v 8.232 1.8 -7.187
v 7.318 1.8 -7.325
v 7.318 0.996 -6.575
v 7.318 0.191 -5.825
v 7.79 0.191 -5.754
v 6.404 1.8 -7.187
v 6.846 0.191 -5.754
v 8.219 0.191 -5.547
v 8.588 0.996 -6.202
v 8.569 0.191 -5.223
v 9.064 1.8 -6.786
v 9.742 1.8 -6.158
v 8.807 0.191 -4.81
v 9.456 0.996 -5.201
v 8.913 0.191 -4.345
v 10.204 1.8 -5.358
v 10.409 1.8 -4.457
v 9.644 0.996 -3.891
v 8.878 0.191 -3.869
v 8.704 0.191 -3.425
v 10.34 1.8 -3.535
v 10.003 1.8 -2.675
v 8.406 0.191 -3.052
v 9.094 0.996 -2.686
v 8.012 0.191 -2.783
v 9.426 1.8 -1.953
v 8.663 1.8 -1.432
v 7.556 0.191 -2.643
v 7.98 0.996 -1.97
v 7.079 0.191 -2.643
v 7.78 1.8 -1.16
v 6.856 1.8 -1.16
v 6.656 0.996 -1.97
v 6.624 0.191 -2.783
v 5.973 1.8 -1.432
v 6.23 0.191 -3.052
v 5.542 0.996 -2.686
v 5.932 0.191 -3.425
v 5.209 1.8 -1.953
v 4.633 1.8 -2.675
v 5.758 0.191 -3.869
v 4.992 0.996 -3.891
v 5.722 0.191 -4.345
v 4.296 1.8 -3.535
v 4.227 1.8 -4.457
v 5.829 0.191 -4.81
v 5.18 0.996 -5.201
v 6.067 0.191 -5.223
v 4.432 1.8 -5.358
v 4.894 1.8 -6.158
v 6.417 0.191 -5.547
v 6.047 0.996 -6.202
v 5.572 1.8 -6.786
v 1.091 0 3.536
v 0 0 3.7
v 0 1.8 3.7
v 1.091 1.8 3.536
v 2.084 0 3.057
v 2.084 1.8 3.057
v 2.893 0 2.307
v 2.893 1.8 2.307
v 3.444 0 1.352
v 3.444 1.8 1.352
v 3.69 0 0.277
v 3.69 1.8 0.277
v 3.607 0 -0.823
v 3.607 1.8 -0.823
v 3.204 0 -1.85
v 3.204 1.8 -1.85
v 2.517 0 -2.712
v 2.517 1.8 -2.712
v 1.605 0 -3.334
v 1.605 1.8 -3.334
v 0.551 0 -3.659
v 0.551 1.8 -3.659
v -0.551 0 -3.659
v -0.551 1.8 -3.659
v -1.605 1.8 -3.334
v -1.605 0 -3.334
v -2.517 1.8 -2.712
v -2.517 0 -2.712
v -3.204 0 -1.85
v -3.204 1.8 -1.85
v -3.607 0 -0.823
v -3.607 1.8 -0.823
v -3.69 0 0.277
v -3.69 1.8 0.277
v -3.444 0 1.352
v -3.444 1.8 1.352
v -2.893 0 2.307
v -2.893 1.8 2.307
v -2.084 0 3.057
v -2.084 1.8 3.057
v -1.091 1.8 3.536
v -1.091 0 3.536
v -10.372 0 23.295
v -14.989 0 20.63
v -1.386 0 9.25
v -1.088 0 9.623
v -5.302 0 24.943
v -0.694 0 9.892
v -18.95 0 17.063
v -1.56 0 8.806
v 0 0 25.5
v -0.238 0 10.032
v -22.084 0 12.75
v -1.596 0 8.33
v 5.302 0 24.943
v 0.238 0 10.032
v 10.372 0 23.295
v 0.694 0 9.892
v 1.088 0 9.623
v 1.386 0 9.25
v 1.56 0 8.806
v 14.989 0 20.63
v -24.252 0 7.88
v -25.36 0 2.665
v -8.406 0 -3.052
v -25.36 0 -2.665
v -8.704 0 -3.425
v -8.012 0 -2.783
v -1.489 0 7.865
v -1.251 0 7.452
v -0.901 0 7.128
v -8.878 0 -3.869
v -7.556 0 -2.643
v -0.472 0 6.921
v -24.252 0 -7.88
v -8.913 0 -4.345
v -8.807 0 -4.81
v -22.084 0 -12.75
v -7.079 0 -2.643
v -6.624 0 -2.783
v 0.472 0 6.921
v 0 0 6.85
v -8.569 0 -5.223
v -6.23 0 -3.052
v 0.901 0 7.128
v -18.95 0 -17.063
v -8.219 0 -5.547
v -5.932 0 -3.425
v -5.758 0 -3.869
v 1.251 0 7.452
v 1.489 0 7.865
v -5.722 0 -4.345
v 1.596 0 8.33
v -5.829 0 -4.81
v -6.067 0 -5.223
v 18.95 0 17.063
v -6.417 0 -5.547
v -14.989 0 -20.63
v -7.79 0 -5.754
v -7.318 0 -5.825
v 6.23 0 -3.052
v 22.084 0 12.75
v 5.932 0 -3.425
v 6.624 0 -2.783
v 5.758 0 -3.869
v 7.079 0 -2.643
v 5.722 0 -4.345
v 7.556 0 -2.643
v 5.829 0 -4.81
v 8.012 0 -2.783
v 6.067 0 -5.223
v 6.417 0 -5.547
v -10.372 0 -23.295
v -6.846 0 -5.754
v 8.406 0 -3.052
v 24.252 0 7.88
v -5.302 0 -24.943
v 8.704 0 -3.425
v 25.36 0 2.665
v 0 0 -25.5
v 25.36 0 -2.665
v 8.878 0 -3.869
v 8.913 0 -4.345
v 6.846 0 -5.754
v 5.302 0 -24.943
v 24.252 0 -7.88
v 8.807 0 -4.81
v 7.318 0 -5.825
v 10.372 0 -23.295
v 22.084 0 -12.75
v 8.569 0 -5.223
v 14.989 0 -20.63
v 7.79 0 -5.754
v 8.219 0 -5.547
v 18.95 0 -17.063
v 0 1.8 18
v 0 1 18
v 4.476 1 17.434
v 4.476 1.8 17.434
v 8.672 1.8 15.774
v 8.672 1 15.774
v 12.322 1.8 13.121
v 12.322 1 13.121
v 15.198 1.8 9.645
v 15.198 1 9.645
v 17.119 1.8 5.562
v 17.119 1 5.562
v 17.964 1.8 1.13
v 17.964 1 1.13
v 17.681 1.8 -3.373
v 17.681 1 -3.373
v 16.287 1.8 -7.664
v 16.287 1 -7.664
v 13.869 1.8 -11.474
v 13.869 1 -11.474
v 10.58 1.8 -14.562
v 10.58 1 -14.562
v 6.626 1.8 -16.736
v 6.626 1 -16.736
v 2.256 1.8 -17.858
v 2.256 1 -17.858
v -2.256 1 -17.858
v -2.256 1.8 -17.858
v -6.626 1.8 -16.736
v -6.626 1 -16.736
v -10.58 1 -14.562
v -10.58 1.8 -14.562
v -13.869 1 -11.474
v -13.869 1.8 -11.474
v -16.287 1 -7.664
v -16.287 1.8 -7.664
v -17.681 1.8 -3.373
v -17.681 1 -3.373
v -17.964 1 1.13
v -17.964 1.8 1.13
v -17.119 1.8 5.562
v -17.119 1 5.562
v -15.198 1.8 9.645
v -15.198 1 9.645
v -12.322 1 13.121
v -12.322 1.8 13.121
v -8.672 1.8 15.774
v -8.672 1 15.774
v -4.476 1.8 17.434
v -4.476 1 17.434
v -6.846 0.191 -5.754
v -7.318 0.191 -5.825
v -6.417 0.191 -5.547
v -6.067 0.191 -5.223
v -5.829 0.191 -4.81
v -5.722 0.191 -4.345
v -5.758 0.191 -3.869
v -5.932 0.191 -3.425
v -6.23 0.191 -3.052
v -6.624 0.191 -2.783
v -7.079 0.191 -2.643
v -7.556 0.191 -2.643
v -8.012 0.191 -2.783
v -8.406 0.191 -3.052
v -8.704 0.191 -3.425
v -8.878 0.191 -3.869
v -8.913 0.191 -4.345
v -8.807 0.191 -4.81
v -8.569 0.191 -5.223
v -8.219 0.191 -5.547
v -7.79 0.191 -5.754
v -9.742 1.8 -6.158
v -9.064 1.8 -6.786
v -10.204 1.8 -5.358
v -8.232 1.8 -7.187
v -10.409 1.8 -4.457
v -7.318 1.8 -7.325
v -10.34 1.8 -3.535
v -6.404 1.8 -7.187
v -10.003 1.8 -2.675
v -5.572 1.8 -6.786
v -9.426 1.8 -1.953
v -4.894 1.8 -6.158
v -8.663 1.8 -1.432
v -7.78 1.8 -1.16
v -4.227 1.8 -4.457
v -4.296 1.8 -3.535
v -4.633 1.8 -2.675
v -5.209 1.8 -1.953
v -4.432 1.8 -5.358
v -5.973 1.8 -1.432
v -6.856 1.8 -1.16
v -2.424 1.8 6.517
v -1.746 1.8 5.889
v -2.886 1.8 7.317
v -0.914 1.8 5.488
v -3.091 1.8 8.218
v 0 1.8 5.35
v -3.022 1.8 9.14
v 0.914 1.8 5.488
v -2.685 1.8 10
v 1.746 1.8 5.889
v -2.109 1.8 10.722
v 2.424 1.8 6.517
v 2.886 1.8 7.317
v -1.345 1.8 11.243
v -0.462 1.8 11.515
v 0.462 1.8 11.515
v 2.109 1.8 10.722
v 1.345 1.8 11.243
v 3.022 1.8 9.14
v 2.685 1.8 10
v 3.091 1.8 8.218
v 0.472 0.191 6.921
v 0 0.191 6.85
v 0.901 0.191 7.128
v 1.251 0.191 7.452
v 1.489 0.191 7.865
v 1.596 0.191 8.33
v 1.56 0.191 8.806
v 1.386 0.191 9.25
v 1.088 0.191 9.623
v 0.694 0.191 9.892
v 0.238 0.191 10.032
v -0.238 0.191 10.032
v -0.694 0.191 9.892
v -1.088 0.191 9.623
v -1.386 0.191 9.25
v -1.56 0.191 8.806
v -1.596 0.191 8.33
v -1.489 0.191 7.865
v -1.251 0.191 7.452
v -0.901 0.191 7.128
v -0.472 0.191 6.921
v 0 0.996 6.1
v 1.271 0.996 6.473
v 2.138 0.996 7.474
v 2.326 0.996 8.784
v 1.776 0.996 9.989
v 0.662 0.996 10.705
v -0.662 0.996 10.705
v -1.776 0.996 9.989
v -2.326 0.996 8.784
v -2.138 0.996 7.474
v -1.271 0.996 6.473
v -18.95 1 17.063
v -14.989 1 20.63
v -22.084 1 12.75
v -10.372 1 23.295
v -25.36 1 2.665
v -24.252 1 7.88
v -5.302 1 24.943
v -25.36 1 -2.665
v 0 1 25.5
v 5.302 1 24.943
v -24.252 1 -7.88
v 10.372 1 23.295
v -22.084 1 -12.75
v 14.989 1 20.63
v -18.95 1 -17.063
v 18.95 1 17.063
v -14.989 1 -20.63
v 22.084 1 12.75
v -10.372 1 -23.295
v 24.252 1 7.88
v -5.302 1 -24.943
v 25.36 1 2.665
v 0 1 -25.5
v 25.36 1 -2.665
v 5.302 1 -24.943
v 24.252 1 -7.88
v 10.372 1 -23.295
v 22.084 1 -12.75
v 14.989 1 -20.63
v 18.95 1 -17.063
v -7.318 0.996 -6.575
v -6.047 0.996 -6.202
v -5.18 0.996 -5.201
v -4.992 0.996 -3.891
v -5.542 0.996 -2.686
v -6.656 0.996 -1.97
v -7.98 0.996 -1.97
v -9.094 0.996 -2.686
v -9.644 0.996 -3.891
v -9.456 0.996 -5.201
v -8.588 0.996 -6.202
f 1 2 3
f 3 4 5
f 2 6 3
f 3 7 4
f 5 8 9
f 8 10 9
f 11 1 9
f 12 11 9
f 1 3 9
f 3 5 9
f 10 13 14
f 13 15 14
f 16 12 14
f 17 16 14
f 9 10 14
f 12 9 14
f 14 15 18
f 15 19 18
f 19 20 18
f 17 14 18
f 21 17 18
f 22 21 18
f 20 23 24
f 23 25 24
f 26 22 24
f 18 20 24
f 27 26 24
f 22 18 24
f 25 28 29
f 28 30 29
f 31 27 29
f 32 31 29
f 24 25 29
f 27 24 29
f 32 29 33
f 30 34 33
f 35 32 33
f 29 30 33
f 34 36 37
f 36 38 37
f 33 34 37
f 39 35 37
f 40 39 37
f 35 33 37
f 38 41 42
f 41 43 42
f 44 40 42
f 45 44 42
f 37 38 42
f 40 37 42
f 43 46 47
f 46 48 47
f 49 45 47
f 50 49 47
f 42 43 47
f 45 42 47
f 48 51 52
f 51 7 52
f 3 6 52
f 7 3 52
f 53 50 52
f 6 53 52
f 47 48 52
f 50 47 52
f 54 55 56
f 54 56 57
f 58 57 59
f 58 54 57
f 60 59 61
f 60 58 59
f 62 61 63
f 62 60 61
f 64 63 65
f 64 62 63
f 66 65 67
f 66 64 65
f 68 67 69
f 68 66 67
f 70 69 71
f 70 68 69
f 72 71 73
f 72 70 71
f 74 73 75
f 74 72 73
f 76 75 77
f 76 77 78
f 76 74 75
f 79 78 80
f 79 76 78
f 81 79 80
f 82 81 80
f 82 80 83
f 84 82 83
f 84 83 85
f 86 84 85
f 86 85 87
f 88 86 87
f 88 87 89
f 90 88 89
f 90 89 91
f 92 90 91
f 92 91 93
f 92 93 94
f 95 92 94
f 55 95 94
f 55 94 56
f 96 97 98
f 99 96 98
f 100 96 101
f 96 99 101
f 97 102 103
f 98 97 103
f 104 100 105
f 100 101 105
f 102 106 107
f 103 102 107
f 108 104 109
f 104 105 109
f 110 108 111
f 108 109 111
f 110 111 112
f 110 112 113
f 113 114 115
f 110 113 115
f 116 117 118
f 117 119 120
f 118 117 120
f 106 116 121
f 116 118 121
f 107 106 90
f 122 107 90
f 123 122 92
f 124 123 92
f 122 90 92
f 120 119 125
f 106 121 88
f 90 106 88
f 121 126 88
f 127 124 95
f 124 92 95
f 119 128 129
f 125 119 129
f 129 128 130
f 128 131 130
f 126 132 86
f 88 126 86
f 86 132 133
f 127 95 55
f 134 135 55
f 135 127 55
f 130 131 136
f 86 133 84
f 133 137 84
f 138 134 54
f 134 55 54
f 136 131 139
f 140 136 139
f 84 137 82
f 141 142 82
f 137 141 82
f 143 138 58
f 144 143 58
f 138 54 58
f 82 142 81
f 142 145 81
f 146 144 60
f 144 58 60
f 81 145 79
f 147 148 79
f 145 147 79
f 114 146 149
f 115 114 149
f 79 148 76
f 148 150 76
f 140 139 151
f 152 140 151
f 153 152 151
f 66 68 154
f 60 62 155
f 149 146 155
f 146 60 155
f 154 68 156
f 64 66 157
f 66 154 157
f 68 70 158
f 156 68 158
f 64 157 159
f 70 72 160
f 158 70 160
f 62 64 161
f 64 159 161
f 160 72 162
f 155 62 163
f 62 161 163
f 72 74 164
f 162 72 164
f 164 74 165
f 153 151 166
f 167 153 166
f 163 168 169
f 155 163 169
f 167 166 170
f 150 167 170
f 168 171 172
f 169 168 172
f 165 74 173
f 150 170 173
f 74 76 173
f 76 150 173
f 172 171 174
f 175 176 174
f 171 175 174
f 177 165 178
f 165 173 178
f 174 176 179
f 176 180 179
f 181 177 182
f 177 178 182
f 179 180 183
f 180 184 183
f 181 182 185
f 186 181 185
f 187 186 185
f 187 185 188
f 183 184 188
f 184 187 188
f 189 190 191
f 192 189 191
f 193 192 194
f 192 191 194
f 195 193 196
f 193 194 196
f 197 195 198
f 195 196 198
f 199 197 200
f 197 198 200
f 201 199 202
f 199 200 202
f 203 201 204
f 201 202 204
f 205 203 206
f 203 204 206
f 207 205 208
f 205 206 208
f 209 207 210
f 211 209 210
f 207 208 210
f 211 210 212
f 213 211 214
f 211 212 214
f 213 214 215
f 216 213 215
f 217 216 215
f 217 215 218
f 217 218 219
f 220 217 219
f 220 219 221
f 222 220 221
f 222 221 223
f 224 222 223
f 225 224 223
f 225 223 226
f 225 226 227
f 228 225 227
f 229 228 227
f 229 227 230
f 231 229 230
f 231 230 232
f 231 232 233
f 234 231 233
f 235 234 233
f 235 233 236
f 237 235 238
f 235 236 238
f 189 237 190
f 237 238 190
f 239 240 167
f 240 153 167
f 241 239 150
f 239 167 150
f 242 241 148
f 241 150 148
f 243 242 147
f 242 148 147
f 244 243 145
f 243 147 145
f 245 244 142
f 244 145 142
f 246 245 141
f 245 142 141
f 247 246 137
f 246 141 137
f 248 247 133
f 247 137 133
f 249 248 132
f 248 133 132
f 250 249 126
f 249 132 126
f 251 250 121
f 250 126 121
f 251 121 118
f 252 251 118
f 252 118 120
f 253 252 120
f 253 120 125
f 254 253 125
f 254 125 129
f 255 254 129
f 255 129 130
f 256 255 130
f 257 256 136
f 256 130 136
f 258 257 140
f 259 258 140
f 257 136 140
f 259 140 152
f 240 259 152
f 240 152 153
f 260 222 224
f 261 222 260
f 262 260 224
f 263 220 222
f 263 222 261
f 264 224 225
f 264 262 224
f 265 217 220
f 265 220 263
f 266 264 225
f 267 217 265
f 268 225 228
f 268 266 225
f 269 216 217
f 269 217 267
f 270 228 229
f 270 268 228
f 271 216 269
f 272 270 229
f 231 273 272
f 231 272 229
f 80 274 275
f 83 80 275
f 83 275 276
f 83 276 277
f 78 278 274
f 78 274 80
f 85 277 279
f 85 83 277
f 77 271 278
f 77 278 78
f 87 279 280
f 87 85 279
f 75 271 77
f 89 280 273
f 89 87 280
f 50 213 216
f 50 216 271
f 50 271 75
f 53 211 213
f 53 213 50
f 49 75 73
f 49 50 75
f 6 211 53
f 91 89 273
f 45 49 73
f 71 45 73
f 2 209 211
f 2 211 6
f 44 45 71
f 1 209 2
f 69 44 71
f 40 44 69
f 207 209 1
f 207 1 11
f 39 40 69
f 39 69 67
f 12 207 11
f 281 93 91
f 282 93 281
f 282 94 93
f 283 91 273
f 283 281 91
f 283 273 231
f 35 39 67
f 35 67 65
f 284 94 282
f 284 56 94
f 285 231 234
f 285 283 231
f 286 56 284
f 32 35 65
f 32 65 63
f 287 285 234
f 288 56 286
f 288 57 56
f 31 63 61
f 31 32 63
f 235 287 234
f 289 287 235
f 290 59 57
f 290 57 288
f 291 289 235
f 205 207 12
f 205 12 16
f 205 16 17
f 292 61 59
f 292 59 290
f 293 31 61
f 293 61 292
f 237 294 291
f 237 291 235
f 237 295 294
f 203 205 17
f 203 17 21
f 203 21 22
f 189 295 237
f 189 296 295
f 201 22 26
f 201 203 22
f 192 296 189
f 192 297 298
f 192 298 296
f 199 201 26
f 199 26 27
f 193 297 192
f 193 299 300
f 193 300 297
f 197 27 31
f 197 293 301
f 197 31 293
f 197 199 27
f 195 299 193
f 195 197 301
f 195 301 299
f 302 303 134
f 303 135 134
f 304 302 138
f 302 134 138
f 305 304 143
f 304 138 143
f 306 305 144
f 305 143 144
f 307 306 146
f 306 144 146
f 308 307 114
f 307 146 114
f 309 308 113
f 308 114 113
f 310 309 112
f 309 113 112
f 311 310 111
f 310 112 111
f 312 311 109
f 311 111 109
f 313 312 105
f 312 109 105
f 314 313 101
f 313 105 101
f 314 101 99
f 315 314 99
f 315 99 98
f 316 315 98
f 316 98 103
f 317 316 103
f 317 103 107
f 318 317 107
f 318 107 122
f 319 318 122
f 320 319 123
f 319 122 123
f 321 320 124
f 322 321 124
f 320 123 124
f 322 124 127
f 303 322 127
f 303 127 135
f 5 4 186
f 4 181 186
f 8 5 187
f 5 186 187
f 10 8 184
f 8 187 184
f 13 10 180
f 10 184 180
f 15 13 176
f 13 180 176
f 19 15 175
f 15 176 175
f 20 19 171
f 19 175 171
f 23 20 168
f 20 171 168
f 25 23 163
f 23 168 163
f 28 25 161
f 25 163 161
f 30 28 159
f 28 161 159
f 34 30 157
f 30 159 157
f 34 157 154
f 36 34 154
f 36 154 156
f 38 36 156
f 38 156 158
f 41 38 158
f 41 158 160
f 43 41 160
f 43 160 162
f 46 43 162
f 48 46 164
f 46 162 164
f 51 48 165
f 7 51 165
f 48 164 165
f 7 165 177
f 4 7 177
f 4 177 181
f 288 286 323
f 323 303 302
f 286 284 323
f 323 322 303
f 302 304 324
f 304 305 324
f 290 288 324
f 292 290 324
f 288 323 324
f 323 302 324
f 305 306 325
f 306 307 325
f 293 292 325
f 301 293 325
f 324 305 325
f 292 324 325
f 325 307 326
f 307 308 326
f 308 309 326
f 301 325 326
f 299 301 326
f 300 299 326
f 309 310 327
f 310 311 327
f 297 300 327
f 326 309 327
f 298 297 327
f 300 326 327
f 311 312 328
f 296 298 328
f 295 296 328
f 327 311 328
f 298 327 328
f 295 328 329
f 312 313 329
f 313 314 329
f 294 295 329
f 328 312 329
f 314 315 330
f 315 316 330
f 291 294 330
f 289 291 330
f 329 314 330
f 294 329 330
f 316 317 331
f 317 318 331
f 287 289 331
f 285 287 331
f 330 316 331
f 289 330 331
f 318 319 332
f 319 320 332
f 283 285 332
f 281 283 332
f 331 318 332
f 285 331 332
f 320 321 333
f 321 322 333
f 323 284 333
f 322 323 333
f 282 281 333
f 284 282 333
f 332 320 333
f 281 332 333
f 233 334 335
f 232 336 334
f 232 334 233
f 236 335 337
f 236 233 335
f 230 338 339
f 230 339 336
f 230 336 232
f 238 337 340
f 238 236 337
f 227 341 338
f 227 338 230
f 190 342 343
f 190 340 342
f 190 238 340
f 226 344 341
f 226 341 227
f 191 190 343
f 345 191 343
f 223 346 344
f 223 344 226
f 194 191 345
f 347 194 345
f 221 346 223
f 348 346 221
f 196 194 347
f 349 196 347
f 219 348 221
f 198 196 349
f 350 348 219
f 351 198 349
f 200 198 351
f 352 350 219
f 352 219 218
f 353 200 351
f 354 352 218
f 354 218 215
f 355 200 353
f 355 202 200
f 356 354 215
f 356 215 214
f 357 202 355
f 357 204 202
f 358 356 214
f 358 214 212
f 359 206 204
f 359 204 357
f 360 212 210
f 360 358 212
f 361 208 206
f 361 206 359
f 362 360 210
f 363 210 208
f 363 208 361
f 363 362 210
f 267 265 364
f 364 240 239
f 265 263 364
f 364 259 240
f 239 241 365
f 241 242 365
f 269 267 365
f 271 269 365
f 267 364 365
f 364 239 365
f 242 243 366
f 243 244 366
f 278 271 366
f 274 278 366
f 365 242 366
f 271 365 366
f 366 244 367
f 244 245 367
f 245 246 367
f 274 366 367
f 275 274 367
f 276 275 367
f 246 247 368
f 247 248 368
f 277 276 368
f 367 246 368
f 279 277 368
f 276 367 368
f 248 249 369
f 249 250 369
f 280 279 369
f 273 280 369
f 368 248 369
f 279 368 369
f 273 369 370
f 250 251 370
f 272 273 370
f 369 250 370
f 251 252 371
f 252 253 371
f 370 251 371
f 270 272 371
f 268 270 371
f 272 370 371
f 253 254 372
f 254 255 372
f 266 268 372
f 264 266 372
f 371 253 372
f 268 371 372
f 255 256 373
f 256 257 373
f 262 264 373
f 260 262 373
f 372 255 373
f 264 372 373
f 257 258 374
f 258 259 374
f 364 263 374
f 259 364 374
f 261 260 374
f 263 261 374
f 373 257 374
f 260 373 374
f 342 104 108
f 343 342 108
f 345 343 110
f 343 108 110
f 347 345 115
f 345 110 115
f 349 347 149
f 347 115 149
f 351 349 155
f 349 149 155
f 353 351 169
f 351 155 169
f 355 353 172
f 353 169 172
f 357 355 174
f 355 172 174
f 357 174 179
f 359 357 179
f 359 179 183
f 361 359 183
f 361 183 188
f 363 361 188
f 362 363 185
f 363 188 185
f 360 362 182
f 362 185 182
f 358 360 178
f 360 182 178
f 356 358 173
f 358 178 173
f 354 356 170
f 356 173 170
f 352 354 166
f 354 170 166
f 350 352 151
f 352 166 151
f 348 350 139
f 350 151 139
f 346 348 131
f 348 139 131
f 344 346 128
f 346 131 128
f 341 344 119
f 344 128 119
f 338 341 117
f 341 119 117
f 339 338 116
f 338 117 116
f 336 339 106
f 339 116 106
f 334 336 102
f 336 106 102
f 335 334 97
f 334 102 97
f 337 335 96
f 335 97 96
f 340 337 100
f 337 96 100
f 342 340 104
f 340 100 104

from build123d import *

# Parameters (mm, degrees)
SKETCH1_R           = 25.5
SKETCH1_R_2         = 3.7
BOSS_EXTRUDE1_DEPTH = 1
SKETCH1_3_R         = 18
SKETCH1_3_R_2       = 3.7
BOSS_EXTRUDE2_DEPTH = 1.8
HOLE1_D             = 3.2
HOLE1_DEPTH         = 7.857098765
HOLE1_CSINK_D       = 6.2
HOLE1_CSINK_ANGLE   = 86


with BuildPart() as part:
    # Sketch1 → Boss-Extrude1 (new body)
    with BuildSketch(Plane(origin=(0, 0, 0), x_dir=(1, 0, 0), z_dir=(0, 1, 0))):
        Circle(SKETCH1_R)
        Circle(SKETCH1_R_2, mode=Mode.SUBTRACT)
    extrude(amount=BOSS_EXTRUDE1_DEPTH)

    # Sketch1<3> → Boss-Extrude2 (add)
    with BuildSketch(Plane(origin=(0, 0, 0), x_dir=(1, 0, 0), z_dir=(0, 1, 0))):
        Circle(SKETCH1_3_R)
        Circle(SKETCH1_3_R_2, mode=Mode.SUBTRACT)
    extrude(amount=BOSS_EXTRUDE2_DEPTH)

    # Hole1
    with Locations(Plane(origin=(7.317914662, 1.8, -4.225), x_dir=(0, 0, 1), z_dir=(0, 1, 0))):
        with Locations((0, 0), (0, -14.635829324), (12.675, -7.317914662)):
            CounterSinkHole(HOLE1_D / 2, HOLE1_CSINK_D / 2, depth=HOLE1_DEPTH, counter_sink_angle=HOLE1_CSINK_ANGLE)


solid = part.part
